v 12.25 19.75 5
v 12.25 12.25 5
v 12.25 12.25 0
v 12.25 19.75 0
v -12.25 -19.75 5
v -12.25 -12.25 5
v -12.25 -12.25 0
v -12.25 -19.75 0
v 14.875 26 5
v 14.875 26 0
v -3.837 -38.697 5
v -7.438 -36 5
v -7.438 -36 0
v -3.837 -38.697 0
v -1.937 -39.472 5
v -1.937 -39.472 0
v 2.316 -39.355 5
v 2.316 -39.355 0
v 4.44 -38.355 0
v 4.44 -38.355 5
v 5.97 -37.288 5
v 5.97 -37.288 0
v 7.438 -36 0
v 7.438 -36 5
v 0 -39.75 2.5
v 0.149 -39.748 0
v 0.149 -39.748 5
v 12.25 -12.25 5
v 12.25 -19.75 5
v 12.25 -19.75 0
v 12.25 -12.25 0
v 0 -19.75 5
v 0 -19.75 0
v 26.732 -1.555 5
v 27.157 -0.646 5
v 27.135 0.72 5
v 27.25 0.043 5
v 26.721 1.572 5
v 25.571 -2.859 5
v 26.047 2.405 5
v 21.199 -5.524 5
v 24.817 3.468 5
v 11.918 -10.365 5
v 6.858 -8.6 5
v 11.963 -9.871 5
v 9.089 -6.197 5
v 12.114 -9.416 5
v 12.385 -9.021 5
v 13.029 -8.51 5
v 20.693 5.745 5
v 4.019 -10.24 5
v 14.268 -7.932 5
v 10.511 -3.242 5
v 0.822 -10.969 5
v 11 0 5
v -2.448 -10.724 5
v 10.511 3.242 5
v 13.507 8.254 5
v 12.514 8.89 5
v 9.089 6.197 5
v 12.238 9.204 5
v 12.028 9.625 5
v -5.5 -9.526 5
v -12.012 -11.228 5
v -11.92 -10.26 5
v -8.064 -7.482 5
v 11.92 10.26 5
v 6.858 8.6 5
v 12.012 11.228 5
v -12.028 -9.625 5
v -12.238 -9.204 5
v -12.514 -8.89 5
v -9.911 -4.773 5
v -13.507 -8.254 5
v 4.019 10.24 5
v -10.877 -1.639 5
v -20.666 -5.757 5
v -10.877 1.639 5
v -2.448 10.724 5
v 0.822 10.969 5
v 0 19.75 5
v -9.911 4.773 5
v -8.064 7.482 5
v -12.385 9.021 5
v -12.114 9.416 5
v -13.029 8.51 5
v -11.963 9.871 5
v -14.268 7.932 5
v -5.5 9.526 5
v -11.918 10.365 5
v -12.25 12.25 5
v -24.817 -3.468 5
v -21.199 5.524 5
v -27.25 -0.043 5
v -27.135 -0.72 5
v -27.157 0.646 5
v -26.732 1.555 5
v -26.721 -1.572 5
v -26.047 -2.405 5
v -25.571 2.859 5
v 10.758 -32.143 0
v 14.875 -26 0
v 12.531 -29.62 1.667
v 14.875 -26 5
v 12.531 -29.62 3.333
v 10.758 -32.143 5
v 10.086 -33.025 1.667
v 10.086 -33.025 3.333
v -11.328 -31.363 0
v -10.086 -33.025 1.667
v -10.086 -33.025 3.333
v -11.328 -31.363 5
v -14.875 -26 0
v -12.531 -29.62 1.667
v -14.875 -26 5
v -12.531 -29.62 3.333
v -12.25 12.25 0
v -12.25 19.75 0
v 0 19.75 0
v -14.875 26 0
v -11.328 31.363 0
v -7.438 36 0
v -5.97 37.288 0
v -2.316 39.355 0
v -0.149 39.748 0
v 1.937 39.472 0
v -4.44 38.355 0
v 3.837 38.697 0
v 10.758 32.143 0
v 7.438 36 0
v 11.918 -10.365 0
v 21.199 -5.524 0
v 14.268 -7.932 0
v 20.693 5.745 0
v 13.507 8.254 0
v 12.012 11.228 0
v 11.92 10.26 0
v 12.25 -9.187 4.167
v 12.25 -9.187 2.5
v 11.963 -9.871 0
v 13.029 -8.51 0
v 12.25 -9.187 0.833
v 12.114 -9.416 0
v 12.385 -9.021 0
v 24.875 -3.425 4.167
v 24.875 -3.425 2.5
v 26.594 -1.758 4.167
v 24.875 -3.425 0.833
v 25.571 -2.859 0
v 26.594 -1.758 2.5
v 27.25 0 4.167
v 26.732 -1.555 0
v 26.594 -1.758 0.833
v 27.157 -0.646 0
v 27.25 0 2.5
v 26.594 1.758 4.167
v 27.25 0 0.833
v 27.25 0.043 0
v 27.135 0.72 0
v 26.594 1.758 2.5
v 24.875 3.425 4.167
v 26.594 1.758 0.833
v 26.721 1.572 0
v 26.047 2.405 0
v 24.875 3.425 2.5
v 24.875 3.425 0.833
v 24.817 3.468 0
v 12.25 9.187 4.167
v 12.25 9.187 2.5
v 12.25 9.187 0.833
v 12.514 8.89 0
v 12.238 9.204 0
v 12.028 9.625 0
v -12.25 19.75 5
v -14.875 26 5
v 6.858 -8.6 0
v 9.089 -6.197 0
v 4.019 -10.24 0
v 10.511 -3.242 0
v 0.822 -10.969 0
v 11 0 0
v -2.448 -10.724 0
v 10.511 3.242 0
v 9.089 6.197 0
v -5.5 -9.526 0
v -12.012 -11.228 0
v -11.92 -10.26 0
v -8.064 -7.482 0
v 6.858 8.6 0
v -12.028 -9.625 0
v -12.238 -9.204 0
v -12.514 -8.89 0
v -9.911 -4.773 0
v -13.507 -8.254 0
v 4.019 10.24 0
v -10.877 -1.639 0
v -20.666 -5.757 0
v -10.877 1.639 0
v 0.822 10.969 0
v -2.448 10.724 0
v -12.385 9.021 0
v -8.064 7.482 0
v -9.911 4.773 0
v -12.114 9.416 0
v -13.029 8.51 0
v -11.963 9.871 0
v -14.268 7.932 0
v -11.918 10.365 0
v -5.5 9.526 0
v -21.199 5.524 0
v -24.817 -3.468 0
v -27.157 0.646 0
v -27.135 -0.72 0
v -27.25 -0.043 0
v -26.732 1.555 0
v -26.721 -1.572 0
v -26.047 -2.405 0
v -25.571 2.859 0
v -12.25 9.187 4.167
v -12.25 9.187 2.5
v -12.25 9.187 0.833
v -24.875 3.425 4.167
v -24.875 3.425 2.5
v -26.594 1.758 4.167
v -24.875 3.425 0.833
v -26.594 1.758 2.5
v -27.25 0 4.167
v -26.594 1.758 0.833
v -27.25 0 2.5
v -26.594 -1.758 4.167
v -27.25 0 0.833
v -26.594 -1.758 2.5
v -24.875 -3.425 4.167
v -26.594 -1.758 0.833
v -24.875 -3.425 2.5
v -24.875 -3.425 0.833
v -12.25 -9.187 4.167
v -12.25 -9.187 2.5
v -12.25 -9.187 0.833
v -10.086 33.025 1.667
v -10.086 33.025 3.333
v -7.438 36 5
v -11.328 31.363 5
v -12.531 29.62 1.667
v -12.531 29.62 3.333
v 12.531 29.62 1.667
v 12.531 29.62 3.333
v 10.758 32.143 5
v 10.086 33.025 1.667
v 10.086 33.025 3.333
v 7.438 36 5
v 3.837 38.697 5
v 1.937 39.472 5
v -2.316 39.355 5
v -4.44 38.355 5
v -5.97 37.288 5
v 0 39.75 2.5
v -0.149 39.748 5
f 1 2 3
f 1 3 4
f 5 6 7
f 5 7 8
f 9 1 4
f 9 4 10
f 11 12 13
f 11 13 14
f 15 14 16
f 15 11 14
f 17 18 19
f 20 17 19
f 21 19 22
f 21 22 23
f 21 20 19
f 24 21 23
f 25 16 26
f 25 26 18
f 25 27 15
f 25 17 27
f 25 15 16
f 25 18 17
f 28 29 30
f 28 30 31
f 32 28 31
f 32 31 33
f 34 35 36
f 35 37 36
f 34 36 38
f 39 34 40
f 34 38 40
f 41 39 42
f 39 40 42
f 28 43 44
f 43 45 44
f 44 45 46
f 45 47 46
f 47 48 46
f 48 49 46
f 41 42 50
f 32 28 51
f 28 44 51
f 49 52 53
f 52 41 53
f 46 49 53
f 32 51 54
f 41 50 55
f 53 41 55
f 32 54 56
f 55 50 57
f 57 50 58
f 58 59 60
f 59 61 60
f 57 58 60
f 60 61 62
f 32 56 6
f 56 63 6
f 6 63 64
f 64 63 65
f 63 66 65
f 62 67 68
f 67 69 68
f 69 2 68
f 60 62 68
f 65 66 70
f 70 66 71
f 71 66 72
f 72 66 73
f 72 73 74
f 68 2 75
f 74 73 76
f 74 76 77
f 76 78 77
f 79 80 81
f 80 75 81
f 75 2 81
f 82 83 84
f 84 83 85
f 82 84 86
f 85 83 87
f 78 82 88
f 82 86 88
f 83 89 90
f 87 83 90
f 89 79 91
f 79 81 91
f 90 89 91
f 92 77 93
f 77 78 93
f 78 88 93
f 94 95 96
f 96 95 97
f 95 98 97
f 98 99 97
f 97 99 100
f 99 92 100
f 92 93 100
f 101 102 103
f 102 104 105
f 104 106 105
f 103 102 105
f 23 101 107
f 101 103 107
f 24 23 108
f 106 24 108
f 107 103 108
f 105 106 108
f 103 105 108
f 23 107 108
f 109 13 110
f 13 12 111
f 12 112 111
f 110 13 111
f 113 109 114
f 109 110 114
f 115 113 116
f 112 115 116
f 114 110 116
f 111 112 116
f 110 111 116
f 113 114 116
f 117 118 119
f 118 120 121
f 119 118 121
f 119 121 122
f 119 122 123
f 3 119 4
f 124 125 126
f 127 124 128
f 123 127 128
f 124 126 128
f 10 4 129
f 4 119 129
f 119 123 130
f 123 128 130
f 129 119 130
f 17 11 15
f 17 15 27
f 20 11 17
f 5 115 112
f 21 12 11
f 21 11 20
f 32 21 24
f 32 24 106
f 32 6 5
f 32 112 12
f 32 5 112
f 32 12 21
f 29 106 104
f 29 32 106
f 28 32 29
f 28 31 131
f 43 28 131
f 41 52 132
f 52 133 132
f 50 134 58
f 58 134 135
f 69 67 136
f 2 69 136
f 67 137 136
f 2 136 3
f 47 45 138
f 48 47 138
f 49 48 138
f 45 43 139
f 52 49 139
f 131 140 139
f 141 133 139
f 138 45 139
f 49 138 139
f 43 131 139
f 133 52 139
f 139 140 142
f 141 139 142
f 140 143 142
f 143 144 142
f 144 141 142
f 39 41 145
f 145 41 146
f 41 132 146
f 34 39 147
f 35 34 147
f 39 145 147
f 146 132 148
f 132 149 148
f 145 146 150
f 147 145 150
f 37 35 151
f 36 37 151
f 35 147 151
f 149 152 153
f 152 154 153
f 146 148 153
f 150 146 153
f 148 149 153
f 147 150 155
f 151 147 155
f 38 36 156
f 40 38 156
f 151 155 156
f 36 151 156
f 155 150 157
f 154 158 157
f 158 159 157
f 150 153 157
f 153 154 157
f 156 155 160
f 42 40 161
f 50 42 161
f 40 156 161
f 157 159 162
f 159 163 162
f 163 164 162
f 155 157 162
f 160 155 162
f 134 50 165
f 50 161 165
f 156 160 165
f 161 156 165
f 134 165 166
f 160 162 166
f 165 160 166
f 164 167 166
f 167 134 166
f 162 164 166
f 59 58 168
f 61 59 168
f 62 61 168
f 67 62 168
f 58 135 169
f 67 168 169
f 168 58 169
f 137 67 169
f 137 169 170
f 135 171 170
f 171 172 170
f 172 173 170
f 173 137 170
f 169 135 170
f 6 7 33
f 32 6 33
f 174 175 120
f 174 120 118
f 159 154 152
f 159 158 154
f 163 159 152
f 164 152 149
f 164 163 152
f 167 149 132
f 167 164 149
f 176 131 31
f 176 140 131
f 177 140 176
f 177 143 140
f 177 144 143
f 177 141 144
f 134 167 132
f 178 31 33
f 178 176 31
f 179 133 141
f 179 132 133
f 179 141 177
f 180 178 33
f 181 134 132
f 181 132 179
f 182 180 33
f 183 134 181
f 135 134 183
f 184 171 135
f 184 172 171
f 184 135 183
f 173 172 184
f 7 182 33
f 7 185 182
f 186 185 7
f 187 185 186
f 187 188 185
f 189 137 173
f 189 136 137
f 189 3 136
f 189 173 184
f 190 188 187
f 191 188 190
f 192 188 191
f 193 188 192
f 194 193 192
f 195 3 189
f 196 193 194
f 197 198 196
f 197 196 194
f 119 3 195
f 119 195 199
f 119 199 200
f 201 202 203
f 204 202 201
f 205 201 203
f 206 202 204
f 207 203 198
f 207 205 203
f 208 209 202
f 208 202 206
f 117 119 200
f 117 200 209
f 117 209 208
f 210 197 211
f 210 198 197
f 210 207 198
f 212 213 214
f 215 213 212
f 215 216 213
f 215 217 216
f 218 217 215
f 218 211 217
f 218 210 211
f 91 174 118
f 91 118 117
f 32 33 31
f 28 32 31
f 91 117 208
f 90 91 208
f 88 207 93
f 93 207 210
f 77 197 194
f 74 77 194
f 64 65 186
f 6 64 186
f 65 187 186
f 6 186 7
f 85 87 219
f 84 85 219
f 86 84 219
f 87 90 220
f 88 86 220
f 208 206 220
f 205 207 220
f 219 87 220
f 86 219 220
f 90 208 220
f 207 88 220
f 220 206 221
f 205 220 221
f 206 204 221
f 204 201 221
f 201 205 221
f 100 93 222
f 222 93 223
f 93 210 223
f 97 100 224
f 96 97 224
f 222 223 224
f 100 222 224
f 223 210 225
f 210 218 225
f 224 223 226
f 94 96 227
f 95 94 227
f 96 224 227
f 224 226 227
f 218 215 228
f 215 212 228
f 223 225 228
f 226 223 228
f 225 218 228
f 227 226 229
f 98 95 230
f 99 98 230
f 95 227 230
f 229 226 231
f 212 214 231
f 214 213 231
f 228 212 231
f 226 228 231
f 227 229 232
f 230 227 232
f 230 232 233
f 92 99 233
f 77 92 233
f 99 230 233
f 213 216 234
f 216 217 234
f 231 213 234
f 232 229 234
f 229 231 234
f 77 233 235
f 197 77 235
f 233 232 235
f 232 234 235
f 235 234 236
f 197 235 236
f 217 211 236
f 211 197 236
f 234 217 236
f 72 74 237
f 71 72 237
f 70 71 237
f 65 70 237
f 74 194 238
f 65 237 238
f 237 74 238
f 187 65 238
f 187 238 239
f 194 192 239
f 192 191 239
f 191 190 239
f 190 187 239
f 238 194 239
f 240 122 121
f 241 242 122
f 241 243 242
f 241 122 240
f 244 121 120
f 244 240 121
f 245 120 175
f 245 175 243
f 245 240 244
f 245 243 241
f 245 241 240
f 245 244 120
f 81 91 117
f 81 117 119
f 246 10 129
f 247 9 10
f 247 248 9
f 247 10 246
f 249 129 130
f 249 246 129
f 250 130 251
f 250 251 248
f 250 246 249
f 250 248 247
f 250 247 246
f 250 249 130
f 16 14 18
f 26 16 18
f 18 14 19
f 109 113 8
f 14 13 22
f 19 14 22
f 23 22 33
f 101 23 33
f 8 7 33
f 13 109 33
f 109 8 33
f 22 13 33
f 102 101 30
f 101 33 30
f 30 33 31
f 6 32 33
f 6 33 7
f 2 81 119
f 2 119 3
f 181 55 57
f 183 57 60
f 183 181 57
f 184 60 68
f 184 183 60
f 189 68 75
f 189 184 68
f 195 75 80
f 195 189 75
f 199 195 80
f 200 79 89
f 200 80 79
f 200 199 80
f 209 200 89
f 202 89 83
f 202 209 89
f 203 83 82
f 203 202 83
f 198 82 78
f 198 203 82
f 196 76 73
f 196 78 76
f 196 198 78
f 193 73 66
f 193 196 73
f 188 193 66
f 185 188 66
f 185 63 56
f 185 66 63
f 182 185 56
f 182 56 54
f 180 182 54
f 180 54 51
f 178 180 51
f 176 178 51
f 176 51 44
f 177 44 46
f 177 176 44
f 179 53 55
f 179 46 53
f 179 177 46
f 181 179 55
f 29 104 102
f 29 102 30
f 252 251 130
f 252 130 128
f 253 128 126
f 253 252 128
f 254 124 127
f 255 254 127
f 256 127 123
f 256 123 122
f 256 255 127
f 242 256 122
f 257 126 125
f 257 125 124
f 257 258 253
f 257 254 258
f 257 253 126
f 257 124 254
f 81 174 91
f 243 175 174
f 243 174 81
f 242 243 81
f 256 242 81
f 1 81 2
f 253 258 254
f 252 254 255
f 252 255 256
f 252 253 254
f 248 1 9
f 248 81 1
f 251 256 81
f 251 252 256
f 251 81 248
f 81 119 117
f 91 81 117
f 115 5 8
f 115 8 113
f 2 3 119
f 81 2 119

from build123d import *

# Parameters (mm, degrees)
F2_DEPTH = 5
F0_R     = 11
F3_DEPTH = 25
F5_DEPTH = 5


with BuildPart() as f2:
    # F1 (on Top) → F2 (new body)
    with BuildSketch(Plane.XY):
        with BuildLine():
            Line((-12.25, 0), (0, 0))
            Line((0, 0), (12.25, 0))
            Line((12.25, 0), (19.75, 0))
            Line((19.75, 0), (27.25, 0))
            add(Edge.make_bspline(
                [(12.25, 12.25), (11.9628576121, 11.122778007), (11.2086978362, 8.1622068007), (19.9092662819, 6.8894781113), (27.25, 2.3637275782), (27.25, 0)],
                knots=[0, 0, 0, 0, 0.1135176944, 0.2981464339, 0.5, 0.5, 0.5, 0.5], degree=3))
            Line((12.25, 12.25), (0, 19.75))
            Line((0, 19.75), (-12.25, 12.25))
            add(Edge.make_bspline(
                [(-12.25, 12.25), (-11.9628576121, 11.122778007), (-11.2086978362, 8.1622068007), (-19.9092662819, 6.8894781113), (-27.25, 2.3637275782), (-27.25, 0)],
                knots=[0, 0, 0, 0, 0.1135176944, 0.2981464339, 0.5, 0.5, 0.5, 0.5], degree=3))
            Line((-27.25, 0), (-19.75, 0))
            Line((-19.75, 0), (-12.25, 0))
        make_face()
        with BuildLine():
            Line((12.25, 0), (0, 0))
            Line((0, 0), (-12.25, 0))
            Line((-12.25, 0), (-19.75, 0))
            Line((-19.75, 0), (-27.25, 0))
            add(Edge.make_bspline(
                [(-27.25, 0), (-27.25, -2.3637275782), (-19.9092662819, -6.8894781113), (-11.2086978362, -8.1622068007), (-11.9628576121, -11.122778007), (-12.25, -12.25)],
                knots=[0.5, 0.5, 0.5, 0.5, 0.7018535661, 0.8864823056, 1, 1, 1, 1], degree=3))
            Line((-12.25, -12.25), (0, -19.75))
            Line((0, -19.75), (12.25, -12.25))
            add(Edge.make_bspline(
                [(27.25, 0), (27.25, -2.3637275782), (19.9092662819, -6.8894781113), (11.2086978362, -8.1622068007), (11.9628576121, -11.122778007), (12.25, -12.25)],
                knots=[0.5, 0.5, 0.5, 0.5, 0.7018535661, 0.8864823056, 1, 1, 1, 1], degree=3))
            Line((27.25, 0), (19.75, 0))
            Line((19.75, 0), (12.25, 0))
        make_face()
    extrude(amount=F2_DEPTH)

    # F0 (on Top) → F3 (cut)
    with BuildSketch(Plane.XY):
        Circle(F0_R)
    extrude(amount=F3_DEPTH, mode=Mode.SUBTRACT)


with BuildPart() as f5:
    # F4 (on face) → F5 (new body)
    with BuildSketch(Plane.XY.offset(5)):
        Polygon((-12.25, 19.75), (-12.25, 12.25), (0, 19.75), (0, 32.25), (-6.125, 26), (-9.7279411765, 22.3235294118), align=None)
        Polygon((0, 32.25), (0, 19.75), (12.25, 12.25), (12.25, 19.75), (9.7279411765, 22.3235294118), (6.125, 26), align=None)
        Polygon((14.875, 26), (6.125, 26), (9.7279411765, 22.3235294118), align=None)
        Polygon((-14.875, 26), (-9.7279411765, 22.3235294118), (-6.125, 26), align=None)
        Polygon((9.7279411765, 22.3235294118), (12.25, 19.75), (14.875, 26), align=None)
        Polygon((-7.4375, 29.125), (-14.875, 26), (-6.125, 26), (0, 32.25), align=None)
        Polygon((7.4375, 29.125), (0, 32.25), (6.125, 26), (14.875, 26), align=None)
        Polygon((-14.875, 26), (-12.25, 19.75), (-9.7279411765, 22.3235294118), align=None)
        Polygon((-7.4375, 29.125), (0, 32.25), (0, 36), (-7.4375, 36), align=None)
        Polygon((0, 36), (0, 32.25), (7.4375, 29.125), (7.4375, 36), align=None)
        with BuildLine():
            Line((7.4375, 36), (7.4375, 29.125))
            Line((7.4375, 29.125), (14.875, 26))
            add(Edge.make_bspline(
                [(14.875, 26), (12.5480593381, 29.6556331865), (10.2211186762, 33.311266373), (7.4375, 36)],
                knots=[0, 0, 0, 0, 0.2750989561, 0.2750989561, 0.2750989561, 0.2750989561], degree=3))
        make_face()
        with BuildLine():
            add(Edge.make_bspline(
                [(-7.4375, 36), (-10.2211186762, 33.311266373), (-12.5480593381, 29.6556331865), (-14.875, 26)],
                knots=[0.7249010439, 0.7249010439, 0.7249010439, 0.7249010439, 1, 1, 1, 1], degree=3))
            Line((-14.875, 26), (-7.4375, 29.125))
            Line((-7.4375, 29.125), (-7.4375, 36))
        make_face()
        with BuildLine():
            add(Edge.make_bspline(
                [(0, 39.75), (-2.5809071759, 39.75), (-5.1618143518, 38.1981144828), (-7.4375, 36)],
                knots=[0.5, 0.5, 0.5, 0.5, 0.7249010439, 0.7249010439, 0.7249010439, 0.7249010439], degree=3))
            Line((-7.4375, 36), (0, 36))
            Line((0, 36), (0, 39.75))
        make_face()
        with BuildLine():
            Line((0, 39.75), (0, 36))
            Line((0, 36), (7.4375, 36))
            add(Edge.make_bspline(
                [(7.4375, 36), (5.1618143518, 38.1981144828), (2.5809071759, 39.75), (0, 39.75)],
                knots=[0.2750989561, 0.2750989561, 0.2750989561, 0.2750989561, 0.5, 0.5, 0.5, 0.5], degree=3))
        make_face()
    extrude(amount=-F5_DEPTH)


with BuildPart() as f5b:
    # F4 (on face) → F5, piece 2 (new body)
    with BuildSketch(Plane.XY.offset(5)):
        Polygon((0, -19.75), (-12.25, -12.25), (-12.25, -19.75), (-9.7279411765, -22.3235294118), (-6.125, -26), (0, -32.25), align=None)
        Polygon((12.25, -12.25), (0, -19.75), (0, -32.25), (6.125, -26), (9.7279411765, -22.3235294118), (12.25, -19.75), align=None)
        Polygon((9.7279411765, -22.3235294118), (6.125, -26), (14.875, -26), align=None)
        Polygon((-6.125, -26), (-9.7279411765, -22.3235294118), (-14.875, -26), align=None)
        Polygon((6.125, -26), (0, -32.25), (7.4375, -29.125), (14.875, -26), align=None)
        Polygon((-6.125, -26), (-14.875, -26), (-7.4375, -29.125), (0, -32.25), align=None)
        Polygon((-9.7279411765, -22.3235294118), (-12.25, -19.75), (-14.875, -26), align=None)
        Polygon((14.875, -26), (12.25, -19.75), (9.7279411765, -22.3235294118), align=None)
        with BuildLine():
            Line((0, -36), (-7.4375, -36))
            add(Edge.make_bspline(
                [(0, -39.75), (-2.5809071759, -39.75), (-5.1618143518, -38.1981144828), (-7.4375, -36)],
                knots=[0.5, 0.5, 0.5, 0.5, 0.7249010439, 0.7249010439, 0.7249010439, 0.7249010439], degree=3))
            Line((0, -39.75), (0, -36))
        make_face()
        with BuildLine():
            Line((7.4375, -36), (0, -36))
            Line((0, -36), (0, -39.75))
            add(Edge.make_bspline(
                [(7.4375, -36), (5.1618143518, -38.1981144828), (2.5809071759, -39.75), (0, -39.75)],
                knots=[0.2750989561, 0.2750989561, 0.2750989561, 0.2750989561, 0.5, 0.5, 0.5, 0.5], degree=3))
        make_face()
        with BuildLine():
            Line((14.875, -26), (7.4375, -29.125))
            Line((7.4375, -29.125), (7.4375, -32.25))
            Line((7.4375, -32.25), (7.4375, -36))
            add(Edge.make_bspline(
                [(14.875, -26), (12.5480593381, -29.6556331865), (10.2211186762, -33.311266373), (7.4375, -36)],
                knots=[0, 0, 0, 0, 0.2750989561, 0.2750989561, 0.2750989561, 0.2750989561], degree=3))
        make_face()
        with BuildLine():
            Line((-7.4375, -29.125), (-14.875, -26))
            add(Edge.make_bspline(
                [(-7.4375, -36), (-10.2211186762, -33.311266373), (-12.5480593381, -29.6556331865), (-14.875, -26)],
                knots=[0.7249010439, 0.7249010439, 0.7249010439, 0.7249010439, 1, 1, 1, 1], degree=3))
            Line((-7.4375, -36), (-7.4375, -32.25))
            Line((-7.4375, -32.25), (-7.4375, -29.125))
        make_face()
        Polygon((0, -36), (0, -32.25), (-7.4375, -29.125), (-7.4375, -32.25), (-7.4375, -36), align=None)
        Polygon((7.4375, -29.125), (0, -32.25), (0, -36), (7.4375, -36), (7.4375, -32.25), align=None)
    extrude(amount=-F5_DEPTH)


solid = Compound([f2.part, f5.part, f5b.part])
